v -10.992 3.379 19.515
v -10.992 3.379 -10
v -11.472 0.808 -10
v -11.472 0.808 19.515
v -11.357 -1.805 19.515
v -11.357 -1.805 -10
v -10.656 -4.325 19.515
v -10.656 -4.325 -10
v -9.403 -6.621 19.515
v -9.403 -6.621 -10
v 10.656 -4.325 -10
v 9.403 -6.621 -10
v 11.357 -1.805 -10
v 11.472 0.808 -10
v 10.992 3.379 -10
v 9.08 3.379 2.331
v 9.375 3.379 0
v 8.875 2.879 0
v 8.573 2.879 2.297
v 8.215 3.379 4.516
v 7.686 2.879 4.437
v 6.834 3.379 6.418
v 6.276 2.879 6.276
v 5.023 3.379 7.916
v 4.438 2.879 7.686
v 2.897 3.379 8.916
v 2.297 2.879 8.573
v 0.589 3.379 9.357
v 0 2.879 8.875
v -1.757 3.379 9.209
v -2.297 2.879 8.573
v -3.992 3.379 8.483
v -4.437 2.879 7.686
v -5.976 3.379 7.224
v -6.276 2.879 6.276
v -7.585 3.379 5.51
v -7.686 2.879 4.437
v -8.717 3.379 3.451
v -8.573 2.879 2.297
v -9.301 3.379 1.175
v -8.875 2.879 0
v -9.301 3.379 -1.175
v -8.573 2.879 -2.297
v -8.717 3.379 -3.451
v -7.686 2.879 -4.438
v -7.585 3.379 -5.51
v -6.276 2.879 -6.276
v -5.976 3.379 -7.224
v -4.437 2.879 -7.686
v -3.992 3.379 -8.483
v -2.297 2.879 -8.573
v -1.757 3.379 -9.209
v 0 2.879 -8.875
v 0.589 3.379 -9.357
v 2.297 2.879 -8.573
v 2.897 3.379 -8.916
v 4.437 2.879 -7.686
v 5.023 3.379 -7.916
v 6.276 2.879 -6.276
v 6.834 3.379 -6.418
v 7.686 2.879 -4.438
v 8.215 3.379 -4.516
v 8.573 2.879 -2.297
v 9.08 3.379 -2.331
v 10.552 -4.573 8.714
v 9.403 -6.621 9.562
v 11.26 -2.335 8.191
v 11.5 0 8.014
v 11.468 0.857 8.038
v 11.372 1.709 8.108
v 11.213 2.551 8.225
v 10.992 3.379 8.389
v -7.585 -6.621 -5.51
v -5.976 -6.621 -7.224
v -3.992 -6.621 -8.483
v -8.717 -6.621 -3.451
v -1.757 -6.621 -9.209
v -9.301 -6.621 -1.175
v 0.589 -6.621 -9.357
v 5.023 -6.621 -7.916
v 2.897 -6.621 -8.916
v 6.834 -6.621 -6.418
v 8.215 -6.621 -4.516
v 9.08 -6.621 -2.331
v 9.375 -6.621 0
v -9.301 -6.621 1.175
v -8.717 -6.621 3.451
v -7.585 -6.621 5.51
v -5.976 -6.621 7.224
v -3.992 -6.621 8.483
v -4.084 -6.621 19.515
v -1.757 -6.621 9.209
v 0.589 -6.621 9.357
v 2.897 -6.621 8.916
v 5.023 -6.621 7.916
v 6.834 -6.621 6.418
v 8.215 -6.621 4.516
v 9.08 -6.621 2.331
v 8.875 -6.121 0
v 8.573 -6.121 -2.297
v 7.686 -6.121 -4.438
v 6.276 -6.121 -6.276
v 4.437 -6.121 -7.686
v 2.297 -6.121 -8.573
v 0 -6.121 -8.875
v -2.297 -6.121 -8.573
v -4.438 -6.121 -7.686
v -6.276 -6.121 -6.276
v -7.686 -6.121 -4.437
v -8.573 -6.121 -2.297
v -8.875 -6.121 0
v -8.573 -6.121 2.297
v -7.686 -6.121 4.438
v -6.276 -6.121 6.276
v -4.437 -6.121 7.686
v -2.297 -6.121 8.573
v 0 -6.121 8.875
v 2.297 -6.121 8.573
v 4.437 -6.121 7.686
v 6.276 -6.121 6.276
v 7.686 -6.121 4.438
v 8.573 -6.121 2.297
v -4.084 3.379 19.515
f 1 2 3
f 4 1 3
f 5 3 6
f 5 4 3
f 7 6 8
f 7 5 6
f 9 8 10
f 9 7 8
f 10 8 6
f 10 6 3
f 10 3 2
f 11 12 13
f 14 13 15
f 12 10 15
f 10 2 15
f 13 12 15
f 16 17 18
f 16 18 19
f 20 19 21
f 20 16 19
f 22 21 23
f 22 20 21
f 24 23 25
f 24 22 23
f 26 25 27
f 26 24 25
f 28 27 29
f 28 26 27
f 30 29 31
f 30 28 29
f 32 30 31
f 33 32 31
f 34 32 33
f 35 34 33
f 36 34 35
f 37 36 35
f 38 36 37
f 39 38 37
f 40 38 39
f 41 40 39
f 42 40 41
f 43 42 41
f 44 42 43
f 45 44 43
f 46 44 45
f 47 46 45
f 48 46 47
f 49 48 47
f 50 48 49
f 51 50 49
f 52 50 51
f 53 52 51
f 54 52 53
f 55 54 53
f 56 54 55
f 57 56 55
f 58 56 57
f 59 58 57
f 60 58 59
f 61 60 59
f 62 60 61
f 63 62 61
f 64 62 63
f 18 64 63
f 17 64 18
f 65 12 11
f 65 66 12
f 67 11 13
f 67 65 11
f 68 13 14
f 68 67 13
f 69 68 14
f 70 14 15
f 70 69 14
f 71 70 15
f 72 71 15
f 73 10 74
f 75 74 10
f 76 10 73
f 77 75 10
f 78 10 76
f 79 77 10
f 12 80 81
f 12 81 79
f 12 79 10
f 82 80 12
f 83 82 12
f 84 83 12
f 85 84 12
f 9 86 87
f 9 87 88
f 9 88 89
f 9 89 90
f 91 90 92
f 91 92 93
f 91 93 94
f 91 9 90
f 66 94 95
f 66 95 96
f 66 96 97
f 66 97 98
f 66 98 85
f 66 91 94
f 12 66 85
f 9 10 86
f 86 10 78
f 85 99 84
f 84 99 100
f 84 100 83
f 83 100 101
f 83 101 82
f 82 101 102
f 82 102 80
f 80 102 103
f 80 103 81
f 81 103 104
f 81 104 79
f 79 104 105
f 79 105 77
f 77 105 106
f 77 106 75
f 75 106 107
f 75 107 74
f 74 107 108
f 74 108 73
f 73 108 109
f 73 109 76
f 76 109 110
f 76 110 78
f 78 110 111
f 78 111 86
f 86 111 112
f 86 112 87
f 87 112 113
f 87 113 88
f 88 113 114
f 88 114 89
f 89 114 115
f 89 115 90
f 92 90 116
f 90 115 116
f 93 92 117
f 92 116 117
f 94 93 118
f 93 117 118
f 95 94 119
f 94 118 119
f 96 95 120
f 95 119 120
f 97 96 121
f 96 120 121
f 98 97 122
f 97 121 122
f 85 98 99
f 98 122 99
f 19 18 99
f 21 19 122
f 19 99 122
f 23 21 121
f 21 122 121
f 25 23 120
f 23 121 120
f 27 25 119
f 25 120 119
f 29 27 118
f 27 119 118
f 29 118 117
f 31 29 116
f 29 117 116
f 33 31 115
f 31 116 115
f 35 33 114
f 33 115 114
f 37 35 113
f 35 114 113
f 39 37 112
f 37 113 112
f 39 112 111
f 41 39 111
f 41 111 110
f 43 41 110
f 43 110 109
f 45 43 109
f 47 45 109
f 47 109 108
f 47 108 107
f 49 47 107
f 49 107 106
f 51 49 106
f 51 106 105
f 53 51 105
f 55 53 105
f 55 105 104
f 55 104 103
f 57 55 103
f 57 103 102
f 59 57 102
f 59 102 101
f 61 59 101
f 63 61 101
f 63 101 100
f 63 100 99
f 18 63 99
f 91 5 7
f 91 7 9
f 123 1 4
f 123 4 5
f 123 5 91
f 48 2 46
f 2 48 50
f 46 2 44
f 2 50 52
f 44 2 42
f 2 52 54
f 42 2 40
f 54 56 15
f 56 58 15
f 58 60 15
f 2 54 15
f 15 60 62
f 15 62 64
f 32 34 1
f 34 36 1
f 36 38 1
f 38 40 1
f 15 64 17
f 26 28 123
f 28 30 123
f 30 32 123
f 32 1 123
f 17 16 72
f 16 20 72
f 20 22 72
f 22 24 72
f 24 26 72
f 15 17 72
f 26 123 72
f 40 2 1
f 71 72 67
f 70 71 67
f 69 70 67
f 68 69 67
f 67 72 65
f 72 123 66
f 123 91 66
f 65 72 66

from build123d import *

# Parameters (mm, degrees)
F1_R          = 11.5
F2_DEPTH      = 19.51505
F2_DEPTH_BACK = 10
F0_R          = 8.875
F3_DEPTH      = 25
F3_DEPTH_BACK = 25
F5_DEPTH      = 25
F5_DEPTH_BACK = 25
F6_W          = 31.0526300933
F6_H          = 13.8705706969
F6_H_2        = 13.1759493425
F7_DEPTH      = 25
F7_DEPTH_BACK = 25
F8_SIZE       = 0.5


with BuildPart() as f2:
    # F1 (on Top) → F2 (new body, two sides)
    with BuildSketch(Plane.XY) as f2_sk:
        Circle(F1_R)
    extrude(amount=F2_DEPTH)
    extrude(f2_sk.sketch, amount=-F2_DEPTH_BACK)

    # F0 (on Front) → F3 (cut, two sides)
    with BuildSketch(Plane.XZ) as f3_sk:
        Circle(F0_R)
    extrude(amount=-F3_DEPTH, mode=Mode.SUBTRACT)
    extrude(f3_sk.sketch, amount=F3_DEPTH_BACK, mode=Mode.SUBTRACT)

    # F4 (on Front) → F5 (cut, two sides)
    with BuildSketch(Plane.XZ) as f5_sk:
        Polygon((24.7668549418, 28.5545103252), (-16.3316316903, 28.5545103252), (24.7668549418, -1.7773286672), align=None)
    extrude(amount=-F5_DEPTH, mode=Mode.SUBTRACT)
    extrude(f5_sk.sketch, amount=F5_DEPTH_BACK, mode=Mode.SUBTRACT)

    # F6 (on Top) → F7 (cut, two sides)
    with BuildSketch(Plane.XY) as f7_sk:
        with Locations((1.910218969, 10.3145037405)):
            Rectangle(F6_W, F6_H)
        with Locations((1.910218969, -13.2087562792)):
            Rectangle(F6_W, F6_H_2)
    extrude(amount=-F7_DEPTH, mode=Mode.SUBTRACT)
    extrude(f7_sk.sketch, amount=F7_DEPTH_BACK, mode=Mode.SUBTRACT)

    # F8
    f8_edges = [f2.edges().sort_by_distance(p)[0] for p in [
        (-8.875, 3.379218, 0),
        (-8.875, -6.620782, 0),
    ]]
    chamfer(f8_edges, length=F8_SIZE)


solid = f2.part
